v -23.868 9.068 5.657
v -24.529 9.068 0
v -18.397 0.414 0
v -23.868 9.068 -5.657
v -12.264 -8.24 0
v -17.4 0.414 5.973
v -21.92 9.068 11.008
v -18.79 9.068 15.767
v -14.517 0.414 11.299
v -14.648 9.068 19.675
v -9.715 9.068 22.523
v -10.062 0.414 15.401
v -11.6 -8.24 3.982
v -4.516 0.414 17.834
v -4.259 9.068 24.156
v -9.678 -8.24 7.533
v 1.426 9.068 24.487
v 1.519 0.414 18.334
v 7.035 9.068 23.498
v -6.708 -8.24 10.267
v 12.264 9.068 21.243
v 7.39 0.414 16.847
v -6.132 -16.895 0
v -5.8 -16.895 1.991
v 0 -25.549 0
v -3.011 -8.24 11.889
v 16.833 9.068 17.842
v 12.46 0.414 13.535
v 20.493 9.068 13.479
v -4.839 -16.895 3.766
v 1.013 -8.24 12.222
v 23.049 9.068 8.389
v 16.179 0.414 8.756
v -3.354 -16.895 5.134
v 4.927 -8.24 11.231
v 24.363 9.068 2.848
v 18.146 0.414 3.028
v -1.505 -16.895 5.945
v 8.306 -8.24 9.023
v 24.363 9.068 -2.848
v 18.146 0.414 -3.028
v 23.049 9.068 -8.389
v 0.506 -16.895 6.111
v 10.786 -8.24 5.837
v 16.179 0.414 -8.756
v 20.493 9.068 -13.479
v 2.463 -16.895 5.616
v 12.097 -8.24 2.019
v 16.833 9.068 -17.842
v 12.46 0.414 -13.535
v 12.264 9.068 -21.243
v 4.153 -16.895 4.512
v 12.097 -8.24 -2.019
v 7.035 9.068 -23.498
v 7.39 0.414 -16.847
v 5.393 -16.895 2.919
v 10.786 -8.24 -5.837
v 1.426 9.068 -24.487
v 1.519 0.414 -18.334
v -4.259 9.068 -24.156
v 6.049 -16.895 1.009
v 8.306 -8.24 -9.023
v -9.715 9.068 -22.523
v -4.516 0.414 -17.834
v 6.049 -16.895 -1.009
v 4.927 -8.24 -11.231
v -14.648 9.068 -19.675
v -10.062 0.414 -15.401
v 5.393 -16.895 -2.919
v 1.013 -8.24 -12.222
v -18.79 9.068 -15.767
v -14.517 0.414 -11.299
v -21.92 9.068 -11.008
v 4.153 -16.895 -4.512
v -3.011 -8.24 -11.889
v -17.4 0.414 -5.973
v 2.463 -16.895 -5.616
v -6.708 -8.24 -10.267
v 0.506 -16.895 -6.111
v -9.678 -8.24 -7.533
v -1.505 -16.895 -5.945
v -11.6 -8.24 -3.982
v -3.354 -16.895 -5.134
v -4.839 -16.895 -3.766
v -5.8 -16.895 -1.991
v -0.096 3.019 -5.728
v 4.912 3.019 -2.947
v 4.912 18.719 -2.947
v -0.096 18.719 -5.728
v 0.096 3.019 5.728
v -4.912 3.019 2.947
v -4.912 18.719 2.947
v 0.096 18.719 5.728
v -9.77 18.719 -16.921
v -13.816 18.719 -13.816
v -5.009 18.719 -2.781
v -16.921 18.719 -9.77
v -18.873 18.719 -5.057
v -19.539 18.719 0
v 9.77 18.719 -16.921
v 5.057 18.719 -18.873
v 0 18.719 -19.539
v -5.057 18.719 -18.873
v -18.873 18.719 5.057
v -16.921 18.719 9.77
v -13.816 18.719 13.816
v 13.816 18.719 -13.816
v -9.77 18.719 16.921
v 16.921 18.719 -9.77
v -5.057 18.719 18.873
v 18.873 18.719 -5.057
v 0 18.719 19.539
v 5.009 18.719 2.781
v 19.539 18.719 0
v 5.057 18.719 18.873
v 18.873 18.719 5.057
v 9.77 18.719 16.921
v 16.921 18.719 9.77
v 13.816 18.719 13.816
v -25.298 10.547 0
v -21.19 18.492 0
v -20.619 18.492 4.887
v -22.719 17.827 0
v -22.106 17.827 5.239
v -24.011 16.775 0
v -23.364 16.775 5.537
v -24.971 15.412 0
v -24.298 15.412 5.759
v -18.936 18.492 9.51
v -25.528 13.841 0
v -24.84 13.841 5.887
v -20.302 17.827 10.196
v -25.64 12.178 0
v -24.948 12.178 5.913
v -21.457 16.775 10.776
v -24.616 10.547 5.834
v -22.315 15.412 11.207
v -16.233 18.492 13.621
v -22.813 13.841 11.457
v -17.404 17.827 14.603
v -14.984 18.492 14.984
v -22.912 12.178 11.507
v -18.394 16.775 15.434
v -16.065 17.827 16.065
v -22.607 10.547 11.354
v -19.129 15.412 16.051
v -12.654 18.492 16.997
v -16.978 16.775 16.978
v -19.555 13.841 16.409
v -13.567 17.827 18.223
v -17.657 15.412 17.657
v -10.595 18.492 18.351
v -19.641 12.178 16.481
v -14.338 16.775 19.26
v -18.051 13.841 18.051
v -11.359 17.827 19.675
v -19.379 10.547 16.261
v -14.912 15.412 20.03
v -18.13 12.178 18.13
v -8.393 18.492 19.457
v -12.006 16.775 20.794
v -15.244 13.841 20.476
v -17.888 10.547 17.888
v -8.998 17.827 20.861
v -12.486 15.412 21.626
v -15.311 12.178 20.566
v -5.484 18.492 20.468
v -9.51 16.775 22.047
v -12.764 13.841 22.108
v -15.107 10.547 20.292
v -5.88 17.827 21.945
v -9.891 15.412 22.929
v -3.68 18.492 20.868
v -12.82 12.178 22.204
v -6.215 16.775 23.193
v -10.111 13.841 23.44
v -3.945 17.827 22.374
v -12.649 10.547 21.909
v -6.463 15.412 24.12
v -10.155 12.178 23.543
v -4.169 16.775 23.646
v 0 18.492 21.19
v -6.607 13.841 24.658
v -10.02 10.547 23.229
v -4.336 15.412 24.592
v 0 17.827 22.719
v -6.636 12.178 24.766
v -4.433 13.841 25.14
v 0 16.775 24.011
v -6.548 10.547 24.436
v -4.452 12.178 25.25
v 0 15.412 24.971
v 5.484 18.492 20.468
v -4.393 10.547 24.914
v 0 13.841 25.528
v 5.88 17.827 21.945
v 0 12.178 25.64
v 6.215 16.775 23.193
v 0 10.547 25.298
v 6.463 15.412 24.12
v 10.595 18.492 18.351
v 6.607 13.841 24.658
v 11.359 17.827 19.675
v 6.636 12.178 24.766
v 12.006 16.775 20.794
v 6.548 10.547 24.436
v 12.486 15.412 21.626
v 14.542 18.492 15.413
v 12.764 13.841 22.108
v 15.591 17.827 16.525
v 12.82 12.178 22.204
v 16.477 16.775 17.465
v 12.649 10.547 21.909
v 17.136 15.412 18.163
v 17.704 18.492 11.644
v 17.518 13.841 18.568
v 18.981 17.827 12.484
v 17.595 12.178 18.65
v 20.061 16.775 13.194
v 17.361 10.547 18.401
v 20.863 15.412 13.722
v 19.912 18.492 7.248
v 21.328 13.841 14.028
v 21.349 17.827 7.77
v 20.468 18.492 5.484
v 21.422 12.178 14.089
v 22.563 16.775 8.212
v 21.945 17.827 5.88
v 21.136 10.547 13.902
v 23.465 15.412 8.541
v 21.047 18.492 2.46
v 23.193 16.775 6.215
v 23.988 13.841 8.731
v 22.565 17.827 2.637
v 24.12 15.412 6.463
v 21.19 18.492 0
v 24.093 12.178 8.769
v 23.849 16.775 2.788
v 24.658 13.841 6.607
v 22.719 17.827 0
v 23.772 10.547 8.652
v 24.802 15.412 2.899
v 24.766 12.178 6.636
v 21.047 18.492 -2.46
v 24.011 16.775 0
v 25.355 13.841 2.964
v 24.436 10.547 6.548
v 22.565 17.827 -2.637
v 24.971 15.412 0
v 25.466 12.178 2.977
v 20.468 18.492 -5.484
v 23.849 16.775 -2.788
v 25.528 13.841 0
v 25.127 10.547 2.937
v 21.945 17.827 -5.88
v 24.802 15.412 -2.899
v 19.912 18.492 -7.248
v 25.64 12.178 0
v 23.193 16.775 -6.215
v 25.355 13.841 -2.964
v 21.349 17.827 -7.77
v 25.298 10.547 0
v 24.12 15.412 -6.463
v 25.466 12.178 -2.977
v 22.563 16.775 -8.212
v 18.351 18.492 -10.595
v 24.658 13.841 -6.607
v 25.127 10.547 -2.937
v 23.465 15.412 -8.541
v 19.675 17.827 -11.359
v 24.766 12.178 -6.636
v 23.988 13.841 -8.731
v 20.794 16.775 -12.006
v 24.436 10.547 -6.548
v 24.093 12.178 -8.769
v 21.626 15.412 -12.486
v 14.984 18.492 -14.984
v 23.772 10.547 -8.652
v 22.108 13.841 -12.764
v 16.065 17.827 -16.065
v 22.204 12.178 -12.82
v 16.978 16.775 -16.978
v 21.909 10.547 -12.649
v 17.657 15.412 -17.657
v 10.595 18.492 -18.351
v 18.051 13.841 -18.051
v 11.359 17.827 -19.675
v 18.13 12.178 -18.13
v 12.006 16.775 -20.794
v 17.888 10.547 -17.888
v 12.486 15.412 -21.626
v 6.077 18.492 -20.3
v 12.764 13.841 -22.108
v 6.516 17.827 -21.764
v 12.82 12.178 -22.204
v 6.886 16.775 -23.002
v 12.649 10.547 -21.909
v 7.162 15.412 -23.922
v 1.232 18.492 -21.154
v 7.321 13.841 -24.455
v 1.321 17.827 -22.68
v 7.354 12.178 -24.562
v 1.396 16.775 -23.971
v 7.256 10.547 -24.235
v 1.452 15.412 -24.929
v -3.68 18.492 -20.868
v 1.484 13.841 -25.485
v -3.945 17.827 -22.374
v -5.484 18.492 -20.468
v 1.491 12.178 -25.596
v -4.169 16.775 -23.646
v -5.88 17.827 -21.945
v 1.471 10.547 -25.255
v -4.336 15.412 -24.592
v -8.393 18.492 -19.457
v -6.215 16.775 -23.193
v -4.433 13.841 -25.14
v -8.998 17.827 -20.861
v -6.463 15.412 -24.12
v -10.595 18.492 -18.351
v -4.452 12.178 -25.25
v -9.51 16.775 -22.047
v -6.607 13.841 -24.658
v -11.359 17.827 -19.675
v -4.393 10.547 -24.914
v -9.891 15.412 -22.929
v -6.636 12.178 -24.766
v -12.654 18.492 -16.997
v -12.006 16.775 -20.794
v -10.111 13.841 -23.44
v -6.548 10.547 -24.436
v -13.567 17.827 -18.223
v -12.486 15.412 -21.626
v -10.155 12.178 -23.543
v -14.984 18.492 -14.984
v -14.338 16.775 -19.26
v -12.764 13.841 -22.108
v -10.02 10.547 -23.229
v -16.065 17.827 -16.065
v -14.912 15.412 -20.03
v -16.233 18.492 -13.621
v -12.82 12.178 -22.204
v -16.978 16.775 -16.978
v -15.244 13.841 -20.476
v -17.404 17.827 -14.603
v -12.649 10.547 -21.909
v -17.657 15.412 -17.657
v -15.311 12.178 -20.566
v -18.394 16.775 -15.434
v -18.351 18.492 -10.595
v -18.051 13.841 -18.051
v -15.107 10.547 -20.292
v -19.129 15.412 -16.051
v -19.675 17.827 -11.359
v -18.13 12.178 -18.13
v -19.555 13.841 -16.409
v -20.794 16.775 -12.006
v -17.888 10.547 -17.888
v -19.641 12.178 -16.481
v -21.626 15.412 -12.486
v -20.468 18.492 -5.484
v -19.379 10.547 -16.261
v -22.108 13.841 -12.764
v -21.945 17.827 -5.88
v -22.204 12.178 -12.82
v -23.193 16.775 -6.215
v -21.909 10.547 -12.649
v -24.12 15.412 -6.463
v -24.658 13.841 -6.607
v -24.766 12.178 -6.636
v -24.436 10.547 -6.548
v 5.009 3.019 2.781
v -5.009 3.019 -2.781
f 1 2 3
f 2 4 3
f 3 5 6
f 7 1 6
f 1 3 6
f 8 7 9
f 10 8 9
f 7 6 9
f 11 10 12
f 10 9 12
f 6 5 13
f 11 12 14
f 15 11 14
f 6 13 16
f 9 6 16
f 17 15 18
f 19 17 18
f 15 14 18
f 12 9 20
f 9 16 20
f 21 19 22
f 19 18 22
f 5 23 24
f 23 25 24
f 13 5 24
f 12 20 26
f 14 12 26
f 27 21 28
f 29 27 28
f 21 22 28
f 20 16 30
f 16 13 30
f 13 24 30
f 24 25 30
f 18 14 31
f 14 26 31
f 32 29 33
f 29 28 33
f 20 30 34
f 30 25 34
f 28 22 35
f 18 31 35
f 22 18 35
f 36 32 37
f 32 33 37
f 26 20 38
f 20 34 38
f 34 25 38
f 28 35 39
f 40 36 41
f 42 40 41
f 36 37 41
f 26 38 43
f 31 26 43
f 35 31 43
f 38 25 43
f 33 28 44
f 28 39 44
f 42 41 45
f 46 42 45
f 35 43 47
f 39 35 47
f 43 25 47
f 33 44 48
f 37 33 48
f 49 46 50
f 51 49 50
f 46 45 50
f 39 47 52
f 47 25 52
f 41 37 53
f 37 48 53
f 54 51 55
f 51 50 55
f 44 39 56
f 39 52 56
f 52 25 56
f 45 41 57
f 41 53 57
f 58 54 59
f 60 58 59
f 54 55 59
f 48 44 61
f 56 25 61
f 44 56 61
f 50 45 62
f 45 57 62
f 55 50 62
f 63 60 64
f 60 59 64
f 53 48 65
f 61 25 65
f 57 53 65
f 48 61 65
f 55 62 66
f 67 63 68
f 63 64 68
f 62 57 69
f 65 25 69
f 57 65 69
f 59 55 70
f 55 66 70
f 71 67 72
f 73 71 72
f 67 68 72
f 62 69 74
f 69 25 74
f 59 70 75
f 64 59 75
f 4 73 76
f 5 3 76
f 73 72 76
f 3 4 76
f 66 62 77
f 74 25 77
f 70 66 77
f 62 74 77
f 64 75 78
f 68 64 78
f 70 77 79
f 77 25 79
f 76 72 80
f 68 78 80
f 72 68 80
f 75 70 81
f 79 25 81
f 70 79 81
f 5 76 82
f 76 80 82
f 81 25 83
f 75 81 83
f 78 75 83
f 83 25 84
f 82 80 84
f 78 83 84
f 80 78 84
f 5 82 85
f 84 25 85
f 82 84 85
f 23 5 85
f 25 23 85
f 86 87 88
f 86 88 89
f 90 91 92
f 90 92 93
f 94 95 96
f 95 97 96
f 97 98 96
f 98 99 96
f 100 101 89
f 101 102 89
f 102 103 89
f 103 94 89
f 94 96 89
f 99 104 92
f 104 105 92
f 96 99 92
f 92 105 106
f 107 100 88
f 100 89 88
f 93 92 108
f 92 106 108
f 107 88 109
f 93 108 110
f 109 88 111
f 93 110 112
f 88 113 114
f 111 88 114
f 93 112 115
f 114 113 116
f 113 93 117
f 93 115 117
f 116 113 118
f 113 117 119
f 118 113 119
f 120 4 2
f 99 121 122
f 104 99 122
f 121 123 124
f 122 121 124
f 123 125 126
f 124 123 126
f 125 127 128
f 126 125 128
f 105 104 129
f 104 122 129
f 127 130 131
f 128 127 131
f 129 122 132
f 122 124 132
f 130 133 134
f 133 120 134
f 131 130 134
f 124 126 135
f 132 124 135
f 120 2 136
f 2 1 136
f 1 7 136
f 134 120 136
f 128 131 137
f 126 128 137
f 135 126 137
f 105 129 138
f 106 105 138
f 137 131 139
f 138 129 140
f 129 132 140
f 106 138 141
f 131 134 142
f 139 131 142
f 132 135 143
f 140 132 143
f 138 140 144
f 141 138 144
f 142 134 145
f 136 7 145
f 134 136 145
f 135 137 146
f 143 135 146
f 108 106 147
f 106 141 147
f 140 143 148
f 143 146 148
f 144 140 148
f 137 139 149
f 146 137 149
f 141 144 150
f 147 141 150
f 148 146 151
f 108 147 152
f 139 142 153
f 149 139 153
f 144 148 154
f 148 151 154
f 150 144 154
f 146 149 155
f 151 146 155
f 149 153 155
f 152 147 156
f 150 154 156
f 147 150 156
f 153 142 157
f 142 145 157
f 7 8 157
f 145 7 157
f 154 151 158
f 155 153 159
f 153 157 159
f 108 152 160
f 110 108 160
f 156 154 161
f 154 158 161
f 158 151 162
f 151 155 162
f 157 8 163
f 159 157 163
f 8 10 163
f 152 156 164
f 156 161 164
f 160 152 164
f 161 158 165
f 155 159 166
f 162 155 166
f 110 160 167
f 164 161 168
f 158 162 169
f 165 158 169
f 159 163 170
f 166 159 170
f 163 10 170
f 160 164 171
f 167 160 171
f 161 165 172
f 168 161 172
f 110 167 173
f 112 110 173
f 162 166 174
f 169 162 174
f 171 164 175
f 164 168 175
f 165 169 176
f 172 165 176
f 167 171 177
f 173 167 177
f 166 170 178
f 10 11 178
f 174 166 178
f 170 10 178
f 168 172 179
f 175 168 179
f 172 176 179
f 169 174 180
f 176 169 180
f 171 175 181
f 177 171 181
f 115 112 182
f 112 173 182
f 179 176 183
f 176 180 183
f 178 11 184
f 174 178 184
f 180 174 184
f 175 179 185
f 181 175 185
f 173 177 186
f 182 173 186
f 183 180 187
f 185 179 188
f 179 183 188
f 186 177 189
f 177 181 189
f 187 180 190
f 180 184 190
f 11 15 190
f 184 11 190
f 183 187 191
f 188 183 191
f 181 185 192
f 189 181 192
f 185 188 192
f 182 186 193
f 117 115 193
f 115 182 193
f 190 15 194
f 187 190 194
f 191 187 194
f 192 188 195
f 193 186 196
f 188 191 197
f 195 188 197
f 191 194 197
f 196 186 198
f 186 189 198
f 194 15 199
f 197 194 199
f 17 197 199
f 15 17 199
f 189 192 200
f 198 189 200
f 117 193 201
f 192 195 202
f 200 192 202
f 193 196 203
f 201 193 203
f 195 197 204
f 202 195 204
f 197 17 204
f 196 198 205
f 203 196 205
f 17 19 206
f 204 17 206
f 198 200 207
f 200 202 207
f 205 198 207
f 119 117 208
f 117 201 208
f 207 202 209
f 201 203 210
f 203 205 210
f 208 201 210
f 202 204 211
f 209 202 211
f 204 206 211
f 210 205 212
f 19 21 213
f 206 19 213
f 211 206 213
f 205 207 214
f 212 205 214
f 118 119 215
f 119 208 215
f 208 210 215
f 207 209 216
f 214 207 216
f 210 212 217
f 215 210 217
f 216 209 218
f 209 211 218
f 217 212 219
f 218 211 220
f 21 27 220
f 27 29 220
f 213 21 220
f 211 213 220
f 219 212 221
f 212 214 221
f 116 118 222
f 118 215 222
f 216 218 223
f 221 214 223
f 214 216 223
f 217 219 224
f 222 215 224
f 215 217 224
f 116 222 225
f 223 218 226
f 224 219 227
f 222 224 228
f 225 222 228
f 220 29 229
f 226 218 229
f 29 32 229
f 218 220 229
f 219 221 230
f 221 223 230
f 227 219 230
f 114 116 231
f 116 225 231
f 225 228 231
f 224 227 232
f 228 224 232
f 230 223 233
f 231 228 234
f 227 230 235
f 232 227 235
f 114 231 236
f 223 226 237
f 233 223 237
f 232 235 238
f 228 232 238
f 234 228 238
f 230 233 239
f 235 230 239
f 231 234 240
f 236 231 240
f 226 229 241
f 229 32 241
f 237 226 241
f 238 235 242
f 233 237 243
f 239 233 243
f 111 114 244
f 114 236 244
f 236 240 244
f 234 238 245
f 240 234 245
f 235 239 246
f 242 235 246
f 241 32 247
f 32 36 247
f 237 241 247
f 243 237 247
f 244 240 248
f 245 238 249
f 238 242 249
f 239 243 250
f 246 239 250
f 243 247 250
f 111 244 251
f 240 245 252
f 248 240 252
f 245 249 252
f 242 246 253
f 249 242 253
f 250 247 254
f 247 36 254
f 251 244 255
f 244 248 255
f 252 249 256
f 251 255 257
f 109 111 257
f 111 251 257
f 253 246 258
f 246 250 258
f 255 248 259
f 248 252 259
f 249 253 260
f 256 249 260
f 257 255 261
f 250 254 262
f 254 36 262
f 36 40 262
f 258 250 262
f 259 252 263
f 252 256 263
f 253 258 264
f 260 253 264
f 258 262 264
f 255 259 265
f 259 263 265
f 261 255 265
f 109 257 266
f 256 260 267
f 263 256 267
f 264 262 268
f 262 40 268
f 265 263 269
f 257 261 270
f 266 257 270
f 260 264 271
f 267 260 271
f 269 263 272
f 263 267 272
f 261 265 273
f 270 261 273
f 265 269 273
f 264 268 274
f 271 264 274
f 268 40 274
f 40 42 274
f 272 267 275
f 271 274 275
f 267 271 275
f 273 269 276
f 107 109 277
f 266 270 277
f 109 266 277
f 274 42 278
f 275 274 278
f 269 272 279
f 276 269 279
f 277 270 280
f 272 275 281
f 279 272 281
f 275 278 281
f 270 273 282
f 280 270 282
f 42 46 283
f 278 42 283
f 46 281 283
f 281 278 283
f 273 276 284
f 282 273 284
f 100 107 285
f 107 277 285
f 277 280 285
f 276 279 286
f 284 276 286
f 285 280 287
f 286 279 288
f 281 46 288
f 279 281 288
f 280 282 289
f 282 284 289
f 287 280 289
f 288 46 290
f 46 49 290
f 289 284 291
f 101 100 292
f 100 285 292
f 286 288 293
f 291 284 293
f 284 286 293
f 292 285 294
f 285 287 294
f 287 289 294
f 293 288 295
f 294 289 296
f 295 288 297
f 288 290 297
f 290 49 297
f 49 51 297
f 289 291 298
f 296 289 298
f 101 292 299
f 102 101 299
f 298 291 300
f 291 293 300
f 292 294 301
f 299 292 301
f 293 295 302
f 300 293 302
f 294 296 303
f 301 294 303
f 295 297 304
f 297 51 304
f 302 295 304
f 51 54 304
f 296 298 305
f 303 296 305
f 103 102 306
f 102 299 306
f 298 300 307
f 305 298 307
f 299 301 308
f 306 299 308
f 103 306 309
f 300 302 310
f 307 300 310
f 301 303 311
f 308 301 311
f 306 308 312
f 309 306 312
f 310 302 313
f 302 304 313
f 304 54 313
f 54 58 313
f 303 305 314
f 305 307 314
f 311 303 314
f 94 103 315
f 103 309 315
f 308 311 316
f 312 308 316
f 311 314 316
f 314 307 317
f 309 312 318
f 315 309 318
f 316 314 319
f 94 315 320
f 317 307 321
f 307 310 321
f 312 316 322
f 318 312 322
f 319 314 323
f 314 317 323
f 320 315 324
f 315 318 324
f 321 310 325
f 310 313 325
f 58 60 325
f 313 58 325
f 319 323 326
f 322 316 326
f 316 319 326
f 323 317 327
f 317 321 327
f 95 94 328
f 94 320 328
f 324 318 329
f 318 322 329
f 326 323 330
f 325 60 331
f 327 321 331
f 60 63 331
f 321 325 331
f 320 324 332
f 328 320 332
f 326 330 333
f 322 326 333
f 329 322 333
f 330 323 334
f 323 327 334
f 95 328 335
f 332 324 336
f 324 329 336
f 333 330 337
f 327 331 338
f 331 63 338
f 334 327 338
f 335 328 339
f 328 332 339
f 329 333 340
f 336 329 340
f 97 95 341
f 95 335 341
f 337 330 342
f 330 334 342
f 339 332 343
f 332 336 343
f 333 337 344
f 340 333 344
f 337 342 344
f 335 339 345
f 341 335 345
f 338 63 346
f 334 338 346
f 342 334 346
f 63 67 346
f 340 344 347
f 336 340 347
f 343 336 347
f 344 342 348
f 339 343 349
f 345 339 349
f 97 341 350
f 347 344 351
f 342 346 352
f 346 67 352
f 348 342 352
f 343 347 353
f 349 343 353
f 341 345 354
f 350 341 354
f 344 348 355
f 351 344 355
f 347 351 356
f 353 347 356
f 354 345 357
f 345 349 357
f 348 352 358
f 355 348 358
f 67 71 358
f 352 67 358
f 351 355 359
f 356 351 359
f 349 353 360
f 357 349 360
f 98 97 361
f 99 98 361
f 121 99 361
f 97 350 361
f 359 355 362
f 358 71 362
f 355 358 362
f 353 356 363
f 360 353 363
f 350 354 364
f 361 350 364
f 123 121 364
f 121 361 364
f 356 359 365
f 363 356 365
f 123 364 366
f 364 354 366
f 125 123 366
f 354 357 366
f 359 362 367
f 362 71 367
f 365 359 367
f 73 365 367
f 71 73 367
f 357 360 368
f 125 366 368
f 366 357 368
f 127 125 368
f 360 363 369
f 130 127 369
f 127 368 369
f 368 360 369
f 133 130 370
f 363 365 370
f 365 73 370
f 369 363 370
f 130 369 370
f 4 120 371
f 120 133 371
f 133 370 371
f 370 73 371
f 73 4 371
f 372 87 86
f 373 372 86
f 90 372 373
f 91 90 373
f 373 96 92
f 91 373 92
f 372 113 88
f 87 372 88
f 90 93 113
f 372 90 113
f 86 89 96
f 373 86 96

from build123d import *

# Parameters (mm, degrees)
F2_R     = 6.115272
F4_DEPTH = 15.7


with BuildPart() as f1:
    # F0 (on Top) → F1 (revolve)
    with BuildSketch(Plane.XY):
        Polygon((0, -25.548944), (0, 18.719036), (-31.367026, 18.719036), align=None)
    revolve(axis=Axis((0, -3.414954, 0), (0, 1, 0)))

    # F2
    f2_edges = [f1.edges().sort_by_distance(p)[0] for p in [
        (31.367026, 18.719036, 0),
    ]]
    fillet(f2_edges, radius=F2_R)

    # F3 (on face) → F4 (cut)
    with BuildSketch(Plane(origin=(0, 18.719036, 0), x_dir=(-1, 0, 0), z_dir=(0, 1, 0))):
        Polygon((-0.096357, 5.727981), (-5.008755, 2.780543), (-4.912399, -2.947438), (0.096357, -5.727981), (5.008755, -2.780543), (4.912399, 2.947438), align=None)
    extrude(amount=-F4_DEPTH, mode=Mode.SUBTRACT)


solid = f1.part
